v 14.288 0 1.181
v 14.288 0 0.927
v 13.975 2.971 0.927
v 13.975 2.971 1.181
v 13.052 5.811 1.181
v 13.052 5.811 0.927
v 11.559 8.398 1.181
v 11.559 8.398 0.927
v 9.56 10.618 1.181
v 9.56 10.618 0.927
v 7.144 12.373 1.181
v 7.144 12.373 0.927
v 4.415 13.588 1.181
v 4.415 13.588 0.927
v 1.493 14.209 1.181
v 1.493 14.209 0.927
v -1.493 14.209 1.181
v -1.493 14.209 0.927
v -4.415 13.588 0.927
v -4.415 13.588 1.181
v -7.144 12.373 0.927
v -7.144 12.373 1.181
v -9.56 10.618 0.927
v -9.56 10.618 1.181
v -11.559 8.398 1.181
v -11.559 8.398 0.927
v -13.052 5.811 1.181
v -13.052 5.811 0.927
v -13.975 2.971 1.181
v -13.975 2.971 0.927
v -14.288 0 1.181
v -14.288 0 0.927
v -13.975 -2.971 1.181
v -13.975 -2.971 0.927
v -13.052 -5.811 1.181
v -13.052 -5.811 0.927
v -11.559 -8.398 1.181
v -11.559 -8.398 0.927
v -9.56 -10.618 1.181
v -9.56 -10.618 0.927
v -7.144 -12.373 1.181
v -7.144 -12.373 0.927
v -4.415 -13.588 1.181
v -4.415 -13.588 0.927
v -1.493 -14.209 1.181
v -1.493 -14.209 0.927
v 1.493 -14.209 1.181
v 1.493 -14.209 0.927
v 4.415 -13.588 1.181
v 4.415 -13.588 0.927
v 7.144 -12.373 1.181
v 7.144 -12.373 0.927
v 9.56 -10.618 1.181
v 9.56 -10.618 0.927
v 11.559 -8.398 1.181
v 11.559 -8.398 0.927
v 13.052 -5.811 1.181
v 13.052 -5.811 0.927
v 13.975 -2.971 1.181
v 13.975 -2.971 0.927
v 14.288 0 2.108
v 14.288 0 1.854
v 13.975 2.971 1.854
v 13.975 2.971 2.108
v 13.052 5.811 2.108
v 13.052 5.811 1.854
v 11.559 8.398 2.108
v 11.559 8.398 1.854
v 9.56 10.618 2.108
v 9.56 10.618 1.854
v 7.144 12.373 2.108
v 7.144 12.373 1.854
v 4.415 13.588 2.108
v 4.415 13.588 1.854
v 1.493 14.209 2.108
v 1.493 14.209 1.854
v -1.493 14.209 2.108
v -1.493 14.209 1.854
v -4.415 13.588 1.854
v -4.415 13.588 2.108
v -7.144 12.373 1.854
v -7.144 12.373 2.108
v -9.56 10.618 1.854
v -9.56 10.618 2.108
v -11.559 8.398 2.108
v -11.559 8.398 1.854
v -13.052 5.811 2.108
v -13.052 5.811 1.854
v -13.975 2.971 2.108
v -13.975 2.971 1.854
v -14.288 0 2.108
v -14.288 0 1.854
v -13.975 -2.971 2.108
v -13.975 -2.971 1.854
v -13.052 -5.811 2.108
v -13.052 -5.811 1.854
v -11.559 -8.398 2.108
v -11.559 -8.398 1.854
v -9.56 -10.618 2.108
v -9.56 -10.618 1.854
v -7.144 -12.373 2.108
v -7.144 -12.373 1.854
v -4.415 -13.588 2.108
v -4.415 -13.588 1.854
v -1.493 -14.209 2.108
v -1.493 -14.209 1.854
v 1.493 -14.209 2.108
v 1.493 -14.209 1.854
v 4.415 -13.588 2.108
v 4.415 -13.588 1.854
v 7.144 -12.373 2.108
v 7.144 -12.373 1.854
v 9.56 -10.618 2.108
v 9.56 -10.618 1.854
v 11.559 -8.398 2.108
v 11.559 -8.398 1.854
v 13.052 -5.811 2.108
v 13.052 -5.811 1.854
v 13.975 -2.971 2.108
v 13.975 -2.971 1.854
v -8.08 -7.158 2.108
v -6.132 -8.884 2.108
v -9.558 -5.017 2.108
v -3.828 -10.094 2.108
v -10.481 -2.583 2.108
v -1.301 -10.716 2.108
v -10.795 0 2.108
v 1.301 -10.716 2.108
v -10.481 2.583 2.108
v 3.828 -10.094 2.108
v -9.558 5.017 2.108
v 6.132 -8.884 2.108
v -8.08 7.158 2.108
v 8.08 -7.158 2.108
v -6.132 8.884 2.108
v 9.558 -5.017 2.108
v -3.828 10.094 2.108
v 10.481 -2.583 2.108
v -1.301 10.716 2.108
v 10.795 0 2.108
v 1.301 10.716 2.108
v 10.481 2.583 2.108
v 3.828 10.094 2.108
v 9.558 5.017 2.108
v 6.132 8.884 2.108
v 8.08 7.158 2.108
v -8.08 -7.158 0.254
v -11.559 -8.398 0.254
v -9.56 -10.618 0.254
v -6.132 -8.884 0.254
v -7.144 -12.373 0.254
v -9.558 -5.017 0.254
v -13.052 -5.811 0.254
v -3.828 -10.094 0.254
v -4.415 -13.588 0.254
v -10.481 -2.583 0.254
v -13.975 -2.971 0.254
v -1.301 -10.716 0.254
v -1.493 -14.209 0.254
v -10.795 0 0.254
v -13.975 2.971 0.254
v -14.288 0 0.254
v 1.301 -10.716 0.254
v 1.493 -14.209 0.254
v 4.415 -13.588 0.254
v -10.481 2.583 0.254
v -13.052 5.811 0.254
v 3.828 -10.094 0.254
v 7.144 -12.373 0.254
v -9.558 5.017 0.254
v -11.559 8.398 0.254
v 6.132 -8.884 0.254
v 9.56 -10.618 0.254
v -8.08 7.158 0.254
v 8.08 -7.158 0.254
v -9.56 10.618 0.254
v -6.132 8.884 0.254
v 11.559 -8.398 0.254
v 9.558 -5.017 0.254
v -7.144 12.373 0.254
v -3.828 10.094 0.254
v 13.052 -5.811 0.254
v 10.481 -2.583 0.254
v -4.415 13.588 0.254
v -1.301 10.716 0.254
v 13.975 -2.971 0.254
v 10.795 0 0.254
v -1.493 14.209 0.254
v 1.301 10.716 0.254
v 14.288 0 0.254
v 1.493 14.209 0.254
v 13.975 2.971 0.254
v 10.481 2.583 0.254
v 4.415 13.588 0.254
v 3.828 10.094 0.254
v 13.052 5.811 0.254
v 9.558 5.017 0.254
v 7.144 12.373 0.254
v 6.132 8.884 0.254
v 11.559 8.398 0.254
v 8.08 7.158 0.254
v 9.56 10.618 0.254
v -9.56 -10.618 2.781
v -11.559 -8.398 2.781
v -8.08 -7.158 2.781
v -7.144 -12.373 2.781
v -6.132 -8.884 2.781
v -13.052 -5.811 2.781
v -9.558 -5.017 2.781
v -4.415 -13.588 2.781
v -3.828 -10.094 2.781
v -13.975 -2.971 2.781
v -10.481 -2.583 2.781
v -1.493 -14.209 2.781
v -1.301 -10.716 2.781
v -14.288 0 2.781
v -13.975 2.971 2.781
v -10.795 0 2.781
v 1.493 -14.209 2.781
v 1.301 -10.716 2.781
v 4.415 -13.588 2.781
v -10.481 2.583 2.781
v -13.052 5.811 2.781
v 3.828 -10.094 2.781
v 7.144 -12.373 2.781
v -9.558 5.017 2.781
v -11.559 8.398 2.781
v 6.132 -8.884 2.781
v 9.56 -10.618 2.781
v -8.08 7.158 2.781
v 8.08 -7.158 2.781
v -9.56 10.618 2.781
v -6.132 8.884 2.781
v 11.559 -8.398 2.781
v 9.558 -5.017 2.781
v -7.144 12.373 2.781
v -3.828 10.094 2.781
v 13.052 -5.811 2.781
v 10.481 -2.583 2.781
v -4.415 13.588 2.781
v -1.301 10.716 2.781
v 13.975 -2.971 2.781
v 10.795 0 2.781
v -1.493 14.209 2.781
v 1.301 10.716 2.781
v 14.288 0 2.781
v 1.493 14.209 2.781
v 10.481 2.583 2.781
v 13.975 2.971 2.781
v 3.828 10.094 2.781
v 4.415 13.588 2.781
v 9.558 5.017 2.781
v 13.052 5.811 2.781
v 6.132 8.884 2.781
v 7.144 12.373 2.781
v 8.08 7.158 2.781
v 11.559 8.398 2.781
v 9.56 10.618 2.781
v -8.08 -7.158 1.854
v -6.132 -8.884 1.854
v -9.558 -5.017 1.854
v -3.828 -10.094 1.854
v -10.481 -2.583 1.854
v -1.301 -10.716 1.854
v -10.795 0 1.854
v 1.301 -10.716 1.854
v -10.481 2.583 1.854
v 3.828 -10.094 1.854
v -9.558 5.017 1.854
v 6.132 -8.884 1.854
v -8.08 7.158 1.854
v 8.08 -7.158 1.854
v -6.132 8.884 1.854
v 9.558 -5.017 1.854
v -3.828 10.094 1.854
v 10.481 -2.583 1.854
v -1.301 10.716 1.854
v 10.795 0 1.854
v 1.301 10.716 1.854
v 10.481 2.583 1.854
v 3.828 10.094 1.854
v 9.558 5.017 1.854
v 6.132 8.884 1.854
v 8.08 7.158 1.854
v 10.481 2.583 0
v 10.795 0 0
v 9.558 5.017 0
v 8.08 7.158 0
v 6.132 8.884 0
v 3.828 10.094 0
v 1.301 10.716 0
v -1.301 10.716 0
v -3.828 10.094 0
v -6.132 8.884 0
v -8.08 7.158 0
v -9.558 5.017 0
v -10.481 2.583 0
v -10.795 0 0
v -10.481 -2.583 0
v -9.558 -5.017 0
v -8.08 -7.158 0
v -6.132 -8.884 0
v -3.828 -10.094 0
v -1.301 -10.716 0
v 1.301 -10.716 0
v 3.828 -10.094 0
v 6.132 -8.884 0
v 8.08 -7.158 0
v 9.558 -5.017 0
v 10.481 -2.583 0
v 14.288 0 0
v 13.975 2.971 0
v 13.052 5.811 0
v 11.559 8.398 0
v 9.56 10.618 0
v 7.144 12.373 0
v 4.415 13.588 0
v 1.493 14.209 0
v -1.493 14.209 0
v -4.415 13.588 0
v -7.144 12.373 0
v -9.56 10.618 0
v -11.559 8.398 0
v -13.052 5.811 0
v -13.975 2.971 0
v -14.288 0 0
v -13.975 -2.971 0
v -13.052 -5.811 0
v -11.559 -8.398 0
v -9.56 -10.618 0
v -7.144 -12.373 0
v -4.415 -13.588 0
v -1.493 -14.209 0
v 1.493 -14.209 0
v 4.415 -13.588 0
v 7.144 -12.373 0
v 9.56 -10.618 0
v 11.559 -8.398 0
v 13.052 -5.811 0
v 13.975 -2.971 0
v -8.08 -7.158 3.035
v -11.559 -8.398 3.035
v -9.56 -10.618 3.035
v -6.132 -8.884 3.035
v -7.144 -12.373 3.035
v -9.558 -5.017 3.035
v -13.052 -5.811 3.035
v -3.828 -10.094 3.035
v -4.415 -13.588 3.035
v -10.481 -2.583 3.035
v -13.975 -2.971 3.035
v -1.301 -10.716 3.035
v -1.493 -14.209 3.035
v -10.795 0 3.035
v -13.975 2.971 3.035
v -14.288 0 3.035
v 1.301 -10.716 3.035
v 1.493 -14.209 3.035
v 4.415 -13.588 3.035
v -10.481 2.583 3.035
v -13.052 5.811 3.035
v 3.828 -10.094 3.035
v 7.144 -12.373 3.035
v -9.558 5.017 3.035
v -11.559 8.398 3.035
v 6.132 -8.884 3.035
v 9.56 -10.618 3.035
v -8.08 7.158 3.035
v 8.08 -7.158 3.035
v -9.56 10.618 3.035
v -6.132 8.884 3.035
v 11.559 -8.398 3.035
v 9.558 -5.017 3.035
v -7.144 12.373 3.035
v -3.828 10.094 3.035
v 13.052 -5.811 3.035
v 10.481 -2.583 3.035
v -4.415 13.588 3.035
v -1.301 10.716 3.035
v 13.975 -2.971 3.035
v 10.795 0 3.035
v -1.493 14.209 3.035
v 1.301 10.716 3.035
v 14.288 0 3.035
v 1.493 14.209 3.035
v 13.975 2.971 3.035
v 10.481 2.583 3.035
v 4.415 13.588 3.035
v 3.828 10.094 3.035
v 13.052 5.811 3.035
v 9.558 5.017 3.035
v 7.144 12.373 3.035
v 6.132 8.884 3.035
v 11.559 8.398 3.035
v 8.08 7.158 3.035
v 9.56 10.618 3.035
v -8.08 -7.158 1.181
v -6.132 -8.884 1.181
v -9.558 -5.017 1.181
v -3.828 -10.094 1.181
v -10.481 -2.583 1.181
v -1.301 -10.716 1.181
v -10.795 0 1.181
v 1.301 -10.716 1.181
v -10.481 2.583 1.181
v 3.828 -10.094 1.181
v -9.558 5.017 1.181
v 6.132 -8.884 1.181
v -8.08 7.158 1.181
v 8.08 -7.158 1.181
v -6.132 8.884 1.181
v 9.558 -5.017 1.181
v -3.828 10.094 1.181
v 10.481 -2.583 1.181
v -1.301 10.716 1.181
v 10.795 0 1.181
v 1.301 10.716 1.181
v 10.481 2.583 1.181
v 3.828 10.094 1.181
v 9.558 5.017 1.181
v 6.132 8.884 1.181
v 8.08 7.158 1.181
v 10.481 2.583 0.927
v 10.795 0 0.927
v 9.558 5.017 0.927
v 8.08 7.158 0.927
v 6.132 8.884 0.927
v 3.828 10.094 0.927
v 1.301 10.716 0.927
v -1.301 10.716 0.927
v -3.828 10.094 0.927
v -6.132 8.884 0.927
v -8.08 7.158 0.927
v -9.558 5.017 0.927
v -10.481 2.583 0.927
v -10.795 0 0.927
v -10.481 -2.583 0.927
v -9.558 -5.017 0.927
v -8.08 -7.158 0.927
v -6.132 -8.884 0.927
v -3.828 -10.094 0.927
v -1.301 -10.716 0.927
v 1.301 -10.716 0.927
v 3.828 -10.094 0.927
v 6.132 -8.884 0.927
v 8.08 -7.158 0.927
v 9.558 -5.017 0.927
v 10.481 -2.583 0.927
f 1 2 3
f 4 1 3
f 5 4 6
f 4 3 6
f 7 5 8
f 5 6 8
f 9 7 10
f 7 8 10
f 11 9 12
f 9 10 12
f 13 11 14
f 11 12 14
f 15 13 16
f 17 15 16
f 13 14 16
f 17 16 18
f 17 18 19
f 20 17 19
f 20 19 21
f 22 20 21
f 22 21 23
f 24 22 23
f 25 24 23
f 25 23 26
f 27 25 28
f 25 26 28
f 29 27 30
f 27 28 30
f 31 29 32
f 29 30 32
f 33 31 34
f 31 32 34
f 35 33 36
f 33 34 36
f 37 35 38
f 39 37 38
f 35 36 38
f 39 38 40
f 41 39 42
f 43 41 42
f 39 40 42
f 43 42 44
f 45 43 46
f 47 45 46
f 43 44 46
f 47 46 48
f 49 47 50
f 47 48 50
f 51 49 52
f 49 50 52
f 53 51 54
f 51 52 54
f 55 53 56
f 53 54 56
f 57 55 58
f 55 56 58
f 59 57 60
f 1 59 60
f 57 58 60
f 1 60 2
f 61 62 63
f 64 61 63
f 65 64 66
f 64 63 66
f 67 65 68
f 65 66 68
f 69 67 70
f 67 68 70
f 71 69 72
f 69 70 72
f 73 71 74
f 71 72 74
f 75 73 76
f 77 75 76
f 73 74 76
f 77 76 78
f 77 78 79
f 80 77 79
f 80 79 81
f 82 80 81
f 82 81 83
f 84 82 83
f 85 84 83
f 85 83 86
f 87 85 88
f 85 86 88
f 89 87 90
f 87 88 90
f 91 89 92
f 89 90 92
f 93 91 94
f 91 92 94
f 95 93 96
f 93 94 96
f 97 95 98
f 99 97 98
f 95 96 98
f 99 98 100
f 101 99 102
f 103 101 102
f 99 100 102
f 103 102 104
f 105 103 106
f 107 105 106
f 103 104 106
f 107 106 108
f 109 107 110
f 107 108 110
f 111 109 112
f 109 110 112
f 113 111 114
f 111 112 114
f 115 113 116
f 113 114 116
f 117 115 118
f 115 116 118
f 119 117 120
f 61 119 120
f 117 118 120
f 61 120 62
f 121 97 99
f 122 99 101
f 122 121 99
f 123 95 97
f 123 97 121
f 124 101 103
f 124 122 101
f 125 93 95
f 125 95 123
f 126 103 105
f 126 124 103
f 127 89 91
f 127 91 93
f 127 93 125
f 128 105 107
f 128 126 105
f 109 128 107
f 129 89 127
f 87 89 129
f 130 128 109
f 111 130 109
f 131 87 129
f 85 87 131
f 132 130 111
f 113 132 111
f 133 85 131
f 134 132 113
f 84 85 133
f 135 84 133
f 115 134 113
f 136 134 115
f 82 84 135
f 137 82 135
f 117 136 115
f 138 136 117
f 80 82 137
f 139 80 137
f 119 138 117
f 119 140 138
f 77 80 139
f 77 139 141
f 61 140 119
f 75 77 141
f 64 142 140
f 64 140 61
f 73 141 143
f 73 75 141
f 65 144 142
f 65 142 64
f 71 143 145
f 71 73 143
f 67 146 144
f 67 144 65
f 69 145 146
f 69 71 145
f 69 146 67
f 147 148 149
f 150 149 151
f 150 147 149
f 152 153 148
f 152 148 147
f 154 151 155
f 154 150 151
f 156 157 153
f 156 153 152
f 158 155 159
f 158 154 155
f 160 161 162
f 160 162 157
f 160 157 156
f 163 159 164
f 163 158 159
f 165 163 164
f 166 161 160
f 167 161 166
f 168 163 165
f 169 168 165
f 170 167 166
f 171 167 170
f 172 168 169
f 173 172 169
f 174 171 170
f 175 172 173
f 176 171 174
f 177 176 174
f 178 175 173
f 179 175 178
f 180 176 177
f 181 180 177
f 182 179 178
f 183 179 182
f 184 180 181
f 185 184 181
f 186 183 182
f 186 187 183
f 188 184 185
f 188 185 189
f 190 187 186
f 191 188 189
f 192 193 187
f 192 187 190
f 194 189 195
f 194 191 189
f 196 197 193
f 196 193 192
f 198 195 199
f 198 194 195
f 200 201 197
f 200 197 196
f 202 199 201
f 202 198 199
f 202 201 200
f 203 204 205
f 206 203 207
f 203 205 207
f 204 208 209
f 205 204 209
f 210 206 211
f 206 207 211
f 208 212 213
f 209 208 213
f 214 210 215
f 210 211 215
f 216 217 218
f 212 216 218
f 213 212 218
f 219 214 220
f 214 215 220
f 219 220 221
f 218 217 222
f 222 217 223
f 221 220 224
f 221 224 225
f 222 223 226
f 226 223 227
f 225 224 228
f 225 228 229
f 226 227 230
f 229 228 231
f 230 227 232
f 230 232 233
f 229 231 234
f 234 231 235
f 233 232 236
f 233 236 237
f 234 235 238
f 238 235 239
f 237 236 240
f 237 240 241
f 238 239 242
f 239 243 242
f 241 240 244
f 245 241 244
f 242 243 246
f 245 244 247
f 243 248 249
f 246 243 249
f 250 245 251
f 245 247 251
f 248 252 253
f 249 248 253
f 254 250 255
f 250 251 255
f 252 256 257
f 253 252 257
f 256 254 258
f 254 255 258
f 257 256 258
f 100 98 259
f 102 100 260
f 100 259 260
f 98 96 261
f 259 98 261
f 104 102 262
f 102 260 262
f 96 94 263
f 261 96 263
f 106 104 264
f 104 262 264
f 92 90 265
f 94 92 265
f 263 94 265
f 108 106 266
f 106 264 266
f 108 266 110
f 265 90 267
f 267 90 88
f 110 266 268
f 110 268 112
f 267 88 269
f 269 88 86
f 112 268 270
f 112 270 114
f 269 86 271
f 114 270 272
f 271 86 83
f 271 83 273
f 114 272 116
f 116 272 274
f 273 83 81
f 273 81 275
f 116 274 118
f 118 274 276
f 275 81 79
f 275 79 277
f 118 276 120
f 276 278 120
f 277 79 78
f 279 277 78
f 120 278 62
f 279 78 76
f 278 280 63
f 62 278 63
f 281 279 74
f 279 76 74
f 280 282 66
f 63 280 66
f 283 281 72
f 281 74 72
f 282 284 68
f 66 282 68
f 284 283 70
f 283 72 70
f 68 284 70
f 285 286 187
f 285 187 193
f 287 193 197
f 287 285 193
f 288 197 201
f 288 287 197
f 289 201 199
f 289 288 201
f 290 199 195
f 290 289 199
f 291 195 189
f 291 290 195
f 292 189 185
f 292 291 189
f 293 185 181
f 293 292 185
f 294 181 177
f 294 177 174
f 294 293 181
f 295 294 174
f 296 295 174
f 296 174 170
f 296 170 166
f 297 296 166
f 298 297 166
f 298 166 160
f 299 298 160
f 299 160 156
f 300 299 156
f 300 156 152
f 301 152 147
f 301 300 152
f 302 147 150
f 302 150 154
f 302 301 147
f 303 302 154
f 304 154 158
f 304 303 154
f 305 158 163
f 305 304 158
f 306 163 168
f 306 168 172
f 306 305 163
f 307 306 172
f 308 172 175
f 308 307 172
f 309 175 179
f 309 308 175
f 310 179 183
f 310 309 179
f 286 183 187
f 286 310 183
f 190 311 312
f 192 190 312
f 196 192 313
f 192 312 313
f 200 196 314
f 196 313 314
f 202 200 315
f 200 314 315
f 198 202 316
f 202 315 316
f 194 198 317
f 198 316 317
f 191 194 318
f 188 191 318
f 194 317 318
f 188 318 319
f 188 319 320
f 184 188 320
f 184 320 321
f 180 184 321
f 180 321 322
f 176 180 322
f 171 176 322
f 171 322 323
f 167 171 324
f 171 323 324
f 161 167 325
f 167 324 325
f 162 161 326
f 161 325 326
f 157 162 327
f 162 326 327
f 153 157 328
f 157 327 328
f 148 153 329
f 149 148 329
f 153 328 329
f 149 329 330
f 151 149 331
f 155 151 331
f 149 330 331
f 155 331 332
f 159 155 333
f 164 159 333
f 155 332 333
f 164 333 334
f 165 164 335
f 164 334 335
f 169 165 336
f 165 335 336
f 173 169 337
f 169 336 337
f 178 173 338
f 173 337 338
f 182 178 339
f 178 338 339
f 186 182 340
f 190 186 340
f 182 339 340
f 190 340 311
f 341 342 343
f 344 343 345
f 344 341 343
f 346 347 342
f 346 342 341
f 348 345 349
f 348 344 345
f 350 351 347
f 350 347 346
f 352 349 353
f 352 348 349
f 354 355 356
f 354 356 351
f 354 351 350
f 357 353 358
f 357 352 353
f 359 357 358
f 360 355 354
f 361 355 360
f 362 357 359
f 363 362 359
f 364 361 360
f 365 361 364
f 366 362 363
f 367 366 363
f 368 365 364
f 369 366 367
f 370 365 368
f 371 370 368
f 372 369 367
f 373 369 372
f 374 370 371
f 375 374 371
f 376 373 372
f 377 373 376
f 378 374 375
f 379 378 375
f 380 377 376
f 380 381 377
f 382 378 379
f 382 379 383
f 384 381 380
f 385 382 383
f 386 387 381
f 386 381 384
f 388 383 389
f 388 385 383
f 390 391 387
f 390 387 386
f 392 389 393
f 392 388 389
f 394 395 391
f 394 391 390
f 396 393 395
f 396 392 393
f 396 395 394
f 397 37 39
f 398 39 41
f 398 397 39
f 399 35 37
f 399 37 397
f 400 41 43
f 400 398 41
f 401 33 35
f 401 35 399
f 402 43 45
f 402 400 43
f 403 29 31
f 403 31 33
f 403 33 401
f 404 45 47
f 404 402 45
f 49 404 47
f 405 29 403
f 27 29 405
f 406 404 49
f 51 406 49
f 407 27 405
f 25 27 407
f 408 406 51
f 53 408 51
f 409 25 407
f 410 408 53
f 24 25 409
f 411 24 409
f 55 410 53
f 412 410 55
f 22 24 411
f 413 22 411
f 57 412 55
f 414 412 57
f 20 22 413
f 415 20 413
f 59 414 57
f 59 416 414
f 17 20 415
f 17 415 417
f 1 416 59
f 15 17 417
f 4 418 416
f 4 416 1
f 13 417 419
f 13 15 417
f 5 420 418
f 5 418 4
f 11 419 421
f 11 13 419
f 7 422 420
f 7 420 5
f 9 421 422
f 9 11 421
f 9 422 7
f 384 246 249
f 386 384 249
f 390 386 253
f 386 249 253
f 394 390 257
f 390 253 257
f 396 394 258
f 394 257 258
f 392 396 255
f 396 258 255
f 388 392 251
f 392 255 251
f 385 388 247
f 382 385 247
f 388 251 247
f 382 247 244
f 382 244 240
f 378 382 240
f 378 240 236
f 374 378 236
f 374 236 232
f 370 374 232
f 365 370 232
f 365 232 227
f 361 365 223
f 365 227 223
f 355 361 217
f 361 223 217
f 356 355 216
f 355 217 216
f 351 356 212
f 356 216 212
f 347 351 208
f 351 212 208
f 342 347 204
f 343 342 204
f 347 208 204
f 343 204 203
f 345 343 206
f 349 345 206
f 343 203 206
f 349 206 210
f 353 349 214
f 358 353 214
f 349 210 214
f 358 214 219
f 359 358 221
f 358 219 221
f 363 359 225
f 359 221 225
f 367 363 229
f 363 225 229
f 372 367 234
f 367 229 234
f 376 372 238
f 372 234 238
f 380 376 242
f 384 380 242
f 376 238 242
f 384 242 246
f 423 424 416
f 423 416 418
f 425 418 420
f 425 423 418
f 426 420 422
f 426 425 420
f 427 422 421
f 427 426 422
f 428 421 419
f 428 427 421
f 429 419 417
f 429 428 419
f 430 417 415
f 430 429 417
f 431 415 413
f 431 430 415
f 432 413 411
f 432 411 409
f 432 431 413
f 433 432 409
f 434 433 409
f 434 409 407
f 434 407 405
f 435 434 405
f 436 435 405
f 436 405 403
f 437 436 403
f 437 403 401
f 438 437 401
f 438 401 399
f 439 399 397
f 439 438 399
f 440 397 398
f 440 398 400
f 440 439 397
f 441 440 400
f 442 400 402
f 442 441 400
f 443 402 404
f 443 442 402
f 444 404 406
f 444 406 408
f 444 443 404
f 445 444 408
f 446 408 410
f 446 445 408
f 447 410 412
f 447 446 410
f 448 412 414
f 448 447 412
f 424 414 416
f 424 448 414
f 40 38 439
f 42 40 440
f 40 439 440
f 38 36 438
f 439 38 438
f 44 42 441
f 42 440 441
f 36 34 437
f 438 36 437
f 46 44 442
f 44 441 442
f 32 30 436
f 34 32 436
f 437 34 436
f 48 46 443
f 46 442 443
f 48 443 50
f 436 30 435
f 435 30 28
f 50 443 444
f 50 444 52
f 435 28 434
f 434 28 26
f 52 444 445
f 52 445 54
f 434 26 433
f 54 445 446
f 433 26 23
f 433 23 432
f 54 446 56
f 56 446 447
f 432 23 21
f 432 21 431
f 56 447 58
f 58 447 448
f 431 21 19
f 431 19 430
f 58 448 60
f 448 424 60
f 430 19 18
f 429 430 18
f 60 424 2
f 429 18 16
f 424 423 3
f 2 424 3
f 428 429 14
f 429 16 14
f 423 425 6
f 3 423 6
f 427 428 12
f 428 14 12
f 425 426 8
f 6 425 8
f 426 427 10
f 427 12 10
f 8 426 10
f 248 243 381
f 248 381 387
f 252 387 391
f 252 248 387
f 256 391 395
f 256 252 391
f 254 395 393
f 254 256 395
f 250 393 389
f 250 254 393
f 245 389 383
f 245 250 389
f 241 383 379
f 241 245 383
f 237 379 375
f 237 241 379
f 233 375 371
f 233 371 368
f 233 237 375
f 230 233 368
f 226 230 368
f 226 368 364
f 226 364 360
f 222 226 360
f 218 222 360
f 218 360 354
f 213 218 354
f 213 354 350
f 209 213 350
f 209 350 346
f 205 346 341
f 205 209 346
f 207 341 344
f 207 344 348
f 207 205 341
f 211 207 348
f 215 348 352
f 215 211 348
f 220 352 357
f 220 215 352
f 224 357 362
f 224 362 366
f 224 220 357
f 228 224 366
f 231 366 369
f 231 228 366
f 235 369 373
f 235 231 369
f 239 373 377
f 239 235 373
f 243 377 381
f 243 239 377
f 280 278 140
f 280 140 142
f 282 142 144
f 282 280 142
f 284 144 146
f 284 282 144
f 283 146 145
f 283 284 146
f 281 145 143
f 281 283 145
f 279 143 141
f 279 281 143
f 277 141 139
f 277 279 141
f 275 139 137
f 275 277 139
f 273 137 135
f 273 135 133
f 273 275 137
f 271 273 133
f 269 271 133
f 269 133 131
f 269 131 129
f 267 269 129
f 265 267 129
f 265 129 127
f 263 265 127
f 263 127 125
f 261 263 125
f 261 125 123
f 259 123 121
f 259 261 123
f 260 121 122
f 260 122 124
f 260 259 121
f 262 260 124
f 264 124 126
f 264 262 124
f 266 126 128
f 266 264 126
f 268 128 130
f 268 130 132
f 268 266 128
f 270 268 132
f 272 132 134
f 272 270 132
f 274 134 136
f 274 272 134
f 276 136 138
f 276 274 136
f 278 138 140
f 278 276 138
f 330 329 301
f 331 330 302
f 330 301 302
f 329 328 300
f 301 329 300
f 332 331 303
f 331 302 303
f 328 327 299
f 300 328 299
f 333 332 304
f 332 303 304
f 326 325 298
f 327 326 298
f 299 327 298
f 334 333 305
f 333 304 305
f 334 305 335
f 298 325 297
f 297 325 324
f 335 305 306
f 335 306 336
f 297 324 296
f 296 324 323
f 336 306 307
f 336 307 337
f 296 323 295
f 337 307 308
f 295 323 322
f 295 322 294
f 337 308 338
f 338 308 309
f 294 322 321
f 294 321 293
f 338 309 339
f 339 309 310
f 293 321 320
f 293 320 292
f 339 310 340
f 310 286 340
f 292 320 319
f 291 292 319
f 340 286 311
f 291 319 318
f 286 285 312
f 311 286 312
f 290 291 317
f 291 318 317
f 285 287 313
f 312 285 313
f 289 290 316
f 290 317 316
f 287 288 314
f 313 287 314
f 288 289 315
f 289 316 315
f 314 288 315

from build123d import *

# Parameters (mm, degrees)
SKETCH1_R          = 14.2875
SKETCH1_R_2        = 10.795
RING_EXTRUDE_DEPTH = 0.254
LPATTERN1_COUNT    = 4
LPATTERN1_PITCH    = 0.9271


with BuildPart() as part:
    # Sketch1 → Ring Extrude (new body)
    with BuildSketch(Plane.XY):
        Circle(SKETCH1_R)
        Circle(SKETCH1_R_2, mode=Mode.SUBTRACT)
    extrude(amount=RING_EXTRUDE_DEPTH)


with BuildPart() as lpattern1_1:
    # LPattern1: pattern copy
    add(part.part.moved(Location(Vector(0, 0, 1) * (1 * LPATTERN1_PITCH))))


with BuildPart() as lpattern1_2:
    # LPattern1: pattern copy
    add(part.part.moved(Location(Vector(0, 0, 1) * (2 * LPATTERN1_PITCH))))


with BuildPart() as lpattern1_3:
    # LPattern1: pattern copy
    add(part.part.moved(Location(Vector(0, 0, 1) * (3 * LPATTERN1_PITCH))))


solid = Compound([part.part, lpattern1_1.part, lpattern1_2.part, lpattern1_3.part])
